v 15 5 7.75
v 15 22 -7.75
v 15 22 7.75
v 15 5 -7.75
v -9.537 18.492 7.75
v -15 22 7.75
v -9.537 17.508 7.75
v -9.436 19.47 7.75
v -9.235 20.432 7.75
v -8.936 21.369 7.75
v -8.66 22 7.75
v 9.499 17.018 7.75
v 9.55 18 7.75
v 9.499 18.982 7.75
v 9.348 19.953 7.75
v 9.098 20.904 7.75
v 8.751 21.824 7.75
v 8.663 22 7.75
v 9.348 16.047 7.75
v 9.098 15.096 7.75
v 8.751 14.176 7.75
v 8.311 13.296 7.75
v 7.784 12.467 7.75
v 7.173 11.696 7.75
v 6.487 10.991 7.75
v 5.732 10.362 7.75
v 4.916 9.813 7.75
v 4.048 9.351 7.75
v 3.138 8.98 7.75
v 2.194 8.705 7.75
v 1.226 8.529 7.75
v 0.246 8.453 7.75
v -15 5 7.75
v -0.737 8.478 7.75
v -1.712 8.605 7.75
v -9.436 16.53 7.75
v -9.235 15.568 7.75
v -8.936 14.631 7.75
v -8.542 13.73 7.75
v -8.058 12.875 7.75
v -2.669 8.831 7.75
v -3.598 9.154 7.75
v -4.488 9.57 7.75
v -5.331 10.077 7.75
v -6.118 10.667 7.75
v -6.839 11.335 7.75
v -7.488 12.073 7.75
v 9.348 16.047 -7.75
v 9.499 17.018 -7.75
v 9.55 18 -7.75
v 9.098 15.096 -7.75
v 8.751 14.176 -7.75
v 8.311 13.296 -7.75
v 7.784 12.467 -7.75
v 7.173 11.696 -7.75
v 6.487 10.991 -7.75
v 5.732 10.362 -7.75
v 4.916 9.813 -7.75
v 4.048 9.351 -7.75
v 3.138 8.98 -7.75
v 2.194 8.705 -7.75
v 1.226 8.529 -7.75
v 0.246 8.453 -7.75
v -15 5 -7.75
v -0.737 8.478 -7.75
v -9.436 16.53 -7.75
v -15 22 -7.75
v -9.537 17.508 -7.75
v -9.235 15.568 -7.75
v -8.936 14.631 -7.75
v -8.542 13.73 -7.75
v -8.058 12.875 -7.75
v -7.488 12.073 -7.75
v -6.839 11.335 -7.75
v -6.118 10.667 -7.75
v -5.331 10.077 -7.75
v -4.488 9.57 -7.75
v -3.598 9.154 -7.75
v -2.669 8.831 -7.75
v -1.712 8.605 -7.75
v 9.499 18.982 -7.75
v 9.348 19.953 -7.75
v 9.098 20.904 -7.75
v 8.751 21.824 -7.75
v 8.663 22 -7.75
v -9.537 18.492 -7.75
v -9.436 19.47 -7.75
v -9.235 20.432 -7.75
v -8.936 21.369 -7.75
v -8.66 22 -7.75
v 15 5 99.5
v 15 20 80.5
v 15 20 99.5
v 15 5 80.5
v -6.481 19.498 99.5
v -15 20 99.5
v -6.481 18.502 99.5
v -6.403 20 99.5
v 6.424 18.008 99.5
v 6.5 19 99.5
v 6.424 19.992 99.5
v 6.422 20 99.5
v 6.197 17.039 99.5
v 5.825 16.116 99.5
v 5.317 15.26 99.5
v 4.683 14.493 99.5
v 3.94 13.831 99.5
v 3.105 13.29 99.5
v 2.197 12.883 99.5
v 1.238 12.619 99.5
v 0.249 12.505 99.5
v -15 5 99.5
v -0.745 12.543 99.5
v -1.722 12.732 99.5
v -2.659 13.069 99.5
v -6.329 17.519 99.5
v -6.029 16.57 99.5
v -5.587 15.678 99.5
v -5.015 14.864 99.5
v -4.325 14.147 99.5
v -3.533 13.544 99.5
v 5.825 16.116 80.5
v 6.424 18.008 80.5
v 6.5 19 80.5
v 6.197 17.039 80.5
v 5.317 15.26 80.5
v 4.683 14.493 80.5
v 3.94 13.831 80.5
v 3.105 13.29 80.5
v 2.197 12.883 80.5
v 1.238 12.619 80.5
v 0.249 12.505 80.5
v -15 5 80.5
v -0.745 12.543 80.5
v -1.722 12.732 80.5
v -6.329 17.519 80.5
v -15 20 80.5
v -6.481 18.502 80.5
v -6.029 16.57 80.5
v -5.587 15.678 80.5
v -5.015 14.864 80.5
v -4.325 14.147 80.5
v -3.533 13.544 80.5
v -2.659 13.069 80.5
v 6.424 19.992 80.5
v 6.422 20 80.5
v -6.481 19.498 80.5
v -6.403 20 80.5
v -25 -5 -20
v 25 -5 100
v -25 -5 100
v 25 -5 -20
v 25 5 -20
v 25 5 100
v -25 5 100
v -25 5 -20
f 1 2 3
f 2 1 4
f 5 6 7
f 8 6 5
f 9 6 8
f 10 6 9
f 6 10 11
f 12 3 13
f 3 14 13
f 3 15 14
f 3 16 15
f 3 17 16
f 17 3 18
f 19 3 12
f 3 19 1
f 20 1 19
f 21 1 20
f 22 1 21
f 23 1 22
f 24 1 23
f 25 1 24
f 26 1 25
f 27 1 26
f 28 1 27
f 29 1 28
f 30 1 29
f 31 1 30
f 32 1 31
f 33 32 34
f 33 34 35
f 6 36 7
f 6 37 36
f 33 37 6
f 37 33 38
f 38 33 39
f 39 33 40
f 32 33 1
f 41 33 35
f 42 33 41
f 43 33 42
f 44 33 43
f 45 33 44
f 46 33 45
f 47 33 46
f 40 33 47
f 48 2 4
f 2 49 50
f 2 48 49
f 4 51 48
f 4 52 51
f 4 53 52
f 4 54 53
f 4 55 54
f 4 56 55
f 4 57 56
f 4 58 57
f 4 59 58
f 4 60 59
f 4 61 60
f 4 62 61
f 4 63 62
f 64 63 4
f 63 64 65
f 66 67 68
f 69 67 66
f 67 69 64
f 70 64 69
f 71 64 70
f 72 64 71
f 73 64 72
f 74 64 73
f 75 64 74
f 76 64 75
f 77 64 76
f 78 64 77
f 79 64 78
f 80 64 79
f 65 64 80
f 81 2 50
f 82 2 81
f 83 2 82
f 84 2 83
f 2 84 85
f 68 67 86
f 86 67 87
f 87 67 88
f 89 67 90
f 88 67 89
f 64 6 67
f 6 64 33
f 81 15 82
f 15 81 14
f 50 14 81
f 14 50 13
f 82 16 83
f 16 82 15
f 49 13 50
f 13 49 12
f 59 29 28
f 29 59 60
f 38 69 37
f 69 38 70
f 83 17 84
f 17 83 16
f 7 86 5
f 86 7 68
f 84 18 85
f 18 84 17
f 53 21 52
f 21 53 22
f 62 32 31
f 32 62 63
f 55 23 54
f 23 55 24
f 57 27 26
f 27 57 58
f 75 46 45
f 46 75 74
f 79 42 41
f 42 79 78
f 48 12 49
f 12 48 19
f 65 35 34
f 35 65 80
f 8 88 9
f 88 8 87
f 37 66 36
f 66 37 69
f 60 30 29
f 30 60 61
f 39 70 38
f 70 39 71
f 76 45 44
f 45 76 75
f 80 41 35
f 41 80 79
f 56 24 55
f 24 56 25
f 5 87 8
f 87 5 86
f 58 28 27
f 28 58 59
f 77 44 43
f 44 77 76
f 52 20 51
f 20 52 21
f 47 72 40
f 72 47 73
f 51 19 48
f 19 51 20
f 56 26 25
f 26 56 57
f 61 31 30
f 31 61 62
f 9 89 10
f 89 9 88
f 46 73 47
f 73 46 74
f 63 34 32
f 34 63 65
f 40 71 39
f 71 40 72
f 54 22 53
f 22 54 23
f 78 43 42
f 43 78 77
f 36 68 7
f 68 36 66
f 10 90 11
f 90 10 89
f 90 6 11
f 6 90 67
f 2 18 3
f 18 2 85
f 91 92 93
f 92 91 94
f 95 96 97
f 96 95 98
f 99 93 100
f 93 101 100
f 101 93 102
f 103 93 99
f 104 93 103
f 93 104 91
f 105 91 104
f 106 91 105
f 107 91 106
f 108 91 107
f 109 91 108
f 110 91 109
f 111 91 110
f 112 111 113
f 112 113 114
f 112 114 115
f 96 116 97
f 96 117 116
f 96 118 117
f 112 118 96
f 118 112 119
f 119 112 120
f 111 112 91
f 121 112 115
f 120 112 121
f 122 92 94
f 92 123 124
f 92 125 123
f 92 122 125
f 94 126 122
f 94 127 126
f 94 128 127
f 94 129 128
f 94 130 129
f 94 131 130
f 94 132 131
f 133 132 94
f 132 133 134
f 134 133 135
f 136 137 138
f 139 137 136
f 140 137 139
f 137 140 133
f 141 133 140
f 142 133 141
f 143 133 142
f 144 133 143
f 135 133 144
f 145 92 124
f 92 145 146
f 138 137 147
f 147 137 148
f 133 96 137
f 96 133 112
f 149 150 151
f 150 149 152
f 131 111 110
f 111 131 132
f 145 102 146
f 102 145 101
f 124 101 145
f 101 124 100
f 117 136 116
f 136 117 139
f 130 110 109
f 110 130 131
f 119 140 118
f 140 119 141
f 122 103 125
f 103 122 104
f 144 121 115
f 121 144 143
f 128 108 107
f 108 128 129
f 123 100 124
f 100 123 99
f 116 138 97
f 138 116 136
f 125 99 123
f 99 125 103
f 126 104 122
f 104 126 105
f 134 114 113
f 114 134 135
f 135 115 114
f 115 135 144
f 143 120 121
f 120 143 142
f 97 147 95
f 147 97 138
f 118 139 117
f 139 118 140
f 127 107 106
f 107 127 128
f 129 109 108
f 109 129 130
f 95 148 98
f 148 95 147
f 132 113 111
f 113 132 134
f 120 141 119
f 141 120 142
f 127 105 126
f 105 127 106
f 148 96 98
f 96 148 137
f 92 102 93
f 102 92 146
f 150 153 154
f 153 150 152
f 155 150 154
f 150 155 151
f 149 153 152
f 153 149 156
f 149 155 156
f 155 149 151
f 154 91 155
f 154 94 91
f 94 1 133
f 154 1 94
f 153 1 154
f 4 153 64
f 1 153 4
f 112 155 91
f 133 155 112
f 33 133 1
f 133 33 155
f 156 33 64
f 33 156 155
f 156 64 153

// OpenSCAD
// all measurements are in millimeters



union()
{
translate([0,0,40])
cube([50,10,120],true);

    difference()
    {    
    translate([0,15,0])    
    cube([30,30,15.5 ],true);
    translate([0,18,-20])
    cylinder(d = 19.1, h = 40, $fs = 1,$fa  = 1);    
    translate([0,37,0])
    cube([30,30,15.5 ],true);
    }
    
    difference()
    {    
    translate([0,10,90])    
    cube([30,30,19],true);
    translate([0,19,70])
    cylinder(d = 13, h = 40, $fs = 1,$fa  = 1); 
    translate([0,35,90])    
    cube([30,30,19],true);   
        
    }
    
 
}
